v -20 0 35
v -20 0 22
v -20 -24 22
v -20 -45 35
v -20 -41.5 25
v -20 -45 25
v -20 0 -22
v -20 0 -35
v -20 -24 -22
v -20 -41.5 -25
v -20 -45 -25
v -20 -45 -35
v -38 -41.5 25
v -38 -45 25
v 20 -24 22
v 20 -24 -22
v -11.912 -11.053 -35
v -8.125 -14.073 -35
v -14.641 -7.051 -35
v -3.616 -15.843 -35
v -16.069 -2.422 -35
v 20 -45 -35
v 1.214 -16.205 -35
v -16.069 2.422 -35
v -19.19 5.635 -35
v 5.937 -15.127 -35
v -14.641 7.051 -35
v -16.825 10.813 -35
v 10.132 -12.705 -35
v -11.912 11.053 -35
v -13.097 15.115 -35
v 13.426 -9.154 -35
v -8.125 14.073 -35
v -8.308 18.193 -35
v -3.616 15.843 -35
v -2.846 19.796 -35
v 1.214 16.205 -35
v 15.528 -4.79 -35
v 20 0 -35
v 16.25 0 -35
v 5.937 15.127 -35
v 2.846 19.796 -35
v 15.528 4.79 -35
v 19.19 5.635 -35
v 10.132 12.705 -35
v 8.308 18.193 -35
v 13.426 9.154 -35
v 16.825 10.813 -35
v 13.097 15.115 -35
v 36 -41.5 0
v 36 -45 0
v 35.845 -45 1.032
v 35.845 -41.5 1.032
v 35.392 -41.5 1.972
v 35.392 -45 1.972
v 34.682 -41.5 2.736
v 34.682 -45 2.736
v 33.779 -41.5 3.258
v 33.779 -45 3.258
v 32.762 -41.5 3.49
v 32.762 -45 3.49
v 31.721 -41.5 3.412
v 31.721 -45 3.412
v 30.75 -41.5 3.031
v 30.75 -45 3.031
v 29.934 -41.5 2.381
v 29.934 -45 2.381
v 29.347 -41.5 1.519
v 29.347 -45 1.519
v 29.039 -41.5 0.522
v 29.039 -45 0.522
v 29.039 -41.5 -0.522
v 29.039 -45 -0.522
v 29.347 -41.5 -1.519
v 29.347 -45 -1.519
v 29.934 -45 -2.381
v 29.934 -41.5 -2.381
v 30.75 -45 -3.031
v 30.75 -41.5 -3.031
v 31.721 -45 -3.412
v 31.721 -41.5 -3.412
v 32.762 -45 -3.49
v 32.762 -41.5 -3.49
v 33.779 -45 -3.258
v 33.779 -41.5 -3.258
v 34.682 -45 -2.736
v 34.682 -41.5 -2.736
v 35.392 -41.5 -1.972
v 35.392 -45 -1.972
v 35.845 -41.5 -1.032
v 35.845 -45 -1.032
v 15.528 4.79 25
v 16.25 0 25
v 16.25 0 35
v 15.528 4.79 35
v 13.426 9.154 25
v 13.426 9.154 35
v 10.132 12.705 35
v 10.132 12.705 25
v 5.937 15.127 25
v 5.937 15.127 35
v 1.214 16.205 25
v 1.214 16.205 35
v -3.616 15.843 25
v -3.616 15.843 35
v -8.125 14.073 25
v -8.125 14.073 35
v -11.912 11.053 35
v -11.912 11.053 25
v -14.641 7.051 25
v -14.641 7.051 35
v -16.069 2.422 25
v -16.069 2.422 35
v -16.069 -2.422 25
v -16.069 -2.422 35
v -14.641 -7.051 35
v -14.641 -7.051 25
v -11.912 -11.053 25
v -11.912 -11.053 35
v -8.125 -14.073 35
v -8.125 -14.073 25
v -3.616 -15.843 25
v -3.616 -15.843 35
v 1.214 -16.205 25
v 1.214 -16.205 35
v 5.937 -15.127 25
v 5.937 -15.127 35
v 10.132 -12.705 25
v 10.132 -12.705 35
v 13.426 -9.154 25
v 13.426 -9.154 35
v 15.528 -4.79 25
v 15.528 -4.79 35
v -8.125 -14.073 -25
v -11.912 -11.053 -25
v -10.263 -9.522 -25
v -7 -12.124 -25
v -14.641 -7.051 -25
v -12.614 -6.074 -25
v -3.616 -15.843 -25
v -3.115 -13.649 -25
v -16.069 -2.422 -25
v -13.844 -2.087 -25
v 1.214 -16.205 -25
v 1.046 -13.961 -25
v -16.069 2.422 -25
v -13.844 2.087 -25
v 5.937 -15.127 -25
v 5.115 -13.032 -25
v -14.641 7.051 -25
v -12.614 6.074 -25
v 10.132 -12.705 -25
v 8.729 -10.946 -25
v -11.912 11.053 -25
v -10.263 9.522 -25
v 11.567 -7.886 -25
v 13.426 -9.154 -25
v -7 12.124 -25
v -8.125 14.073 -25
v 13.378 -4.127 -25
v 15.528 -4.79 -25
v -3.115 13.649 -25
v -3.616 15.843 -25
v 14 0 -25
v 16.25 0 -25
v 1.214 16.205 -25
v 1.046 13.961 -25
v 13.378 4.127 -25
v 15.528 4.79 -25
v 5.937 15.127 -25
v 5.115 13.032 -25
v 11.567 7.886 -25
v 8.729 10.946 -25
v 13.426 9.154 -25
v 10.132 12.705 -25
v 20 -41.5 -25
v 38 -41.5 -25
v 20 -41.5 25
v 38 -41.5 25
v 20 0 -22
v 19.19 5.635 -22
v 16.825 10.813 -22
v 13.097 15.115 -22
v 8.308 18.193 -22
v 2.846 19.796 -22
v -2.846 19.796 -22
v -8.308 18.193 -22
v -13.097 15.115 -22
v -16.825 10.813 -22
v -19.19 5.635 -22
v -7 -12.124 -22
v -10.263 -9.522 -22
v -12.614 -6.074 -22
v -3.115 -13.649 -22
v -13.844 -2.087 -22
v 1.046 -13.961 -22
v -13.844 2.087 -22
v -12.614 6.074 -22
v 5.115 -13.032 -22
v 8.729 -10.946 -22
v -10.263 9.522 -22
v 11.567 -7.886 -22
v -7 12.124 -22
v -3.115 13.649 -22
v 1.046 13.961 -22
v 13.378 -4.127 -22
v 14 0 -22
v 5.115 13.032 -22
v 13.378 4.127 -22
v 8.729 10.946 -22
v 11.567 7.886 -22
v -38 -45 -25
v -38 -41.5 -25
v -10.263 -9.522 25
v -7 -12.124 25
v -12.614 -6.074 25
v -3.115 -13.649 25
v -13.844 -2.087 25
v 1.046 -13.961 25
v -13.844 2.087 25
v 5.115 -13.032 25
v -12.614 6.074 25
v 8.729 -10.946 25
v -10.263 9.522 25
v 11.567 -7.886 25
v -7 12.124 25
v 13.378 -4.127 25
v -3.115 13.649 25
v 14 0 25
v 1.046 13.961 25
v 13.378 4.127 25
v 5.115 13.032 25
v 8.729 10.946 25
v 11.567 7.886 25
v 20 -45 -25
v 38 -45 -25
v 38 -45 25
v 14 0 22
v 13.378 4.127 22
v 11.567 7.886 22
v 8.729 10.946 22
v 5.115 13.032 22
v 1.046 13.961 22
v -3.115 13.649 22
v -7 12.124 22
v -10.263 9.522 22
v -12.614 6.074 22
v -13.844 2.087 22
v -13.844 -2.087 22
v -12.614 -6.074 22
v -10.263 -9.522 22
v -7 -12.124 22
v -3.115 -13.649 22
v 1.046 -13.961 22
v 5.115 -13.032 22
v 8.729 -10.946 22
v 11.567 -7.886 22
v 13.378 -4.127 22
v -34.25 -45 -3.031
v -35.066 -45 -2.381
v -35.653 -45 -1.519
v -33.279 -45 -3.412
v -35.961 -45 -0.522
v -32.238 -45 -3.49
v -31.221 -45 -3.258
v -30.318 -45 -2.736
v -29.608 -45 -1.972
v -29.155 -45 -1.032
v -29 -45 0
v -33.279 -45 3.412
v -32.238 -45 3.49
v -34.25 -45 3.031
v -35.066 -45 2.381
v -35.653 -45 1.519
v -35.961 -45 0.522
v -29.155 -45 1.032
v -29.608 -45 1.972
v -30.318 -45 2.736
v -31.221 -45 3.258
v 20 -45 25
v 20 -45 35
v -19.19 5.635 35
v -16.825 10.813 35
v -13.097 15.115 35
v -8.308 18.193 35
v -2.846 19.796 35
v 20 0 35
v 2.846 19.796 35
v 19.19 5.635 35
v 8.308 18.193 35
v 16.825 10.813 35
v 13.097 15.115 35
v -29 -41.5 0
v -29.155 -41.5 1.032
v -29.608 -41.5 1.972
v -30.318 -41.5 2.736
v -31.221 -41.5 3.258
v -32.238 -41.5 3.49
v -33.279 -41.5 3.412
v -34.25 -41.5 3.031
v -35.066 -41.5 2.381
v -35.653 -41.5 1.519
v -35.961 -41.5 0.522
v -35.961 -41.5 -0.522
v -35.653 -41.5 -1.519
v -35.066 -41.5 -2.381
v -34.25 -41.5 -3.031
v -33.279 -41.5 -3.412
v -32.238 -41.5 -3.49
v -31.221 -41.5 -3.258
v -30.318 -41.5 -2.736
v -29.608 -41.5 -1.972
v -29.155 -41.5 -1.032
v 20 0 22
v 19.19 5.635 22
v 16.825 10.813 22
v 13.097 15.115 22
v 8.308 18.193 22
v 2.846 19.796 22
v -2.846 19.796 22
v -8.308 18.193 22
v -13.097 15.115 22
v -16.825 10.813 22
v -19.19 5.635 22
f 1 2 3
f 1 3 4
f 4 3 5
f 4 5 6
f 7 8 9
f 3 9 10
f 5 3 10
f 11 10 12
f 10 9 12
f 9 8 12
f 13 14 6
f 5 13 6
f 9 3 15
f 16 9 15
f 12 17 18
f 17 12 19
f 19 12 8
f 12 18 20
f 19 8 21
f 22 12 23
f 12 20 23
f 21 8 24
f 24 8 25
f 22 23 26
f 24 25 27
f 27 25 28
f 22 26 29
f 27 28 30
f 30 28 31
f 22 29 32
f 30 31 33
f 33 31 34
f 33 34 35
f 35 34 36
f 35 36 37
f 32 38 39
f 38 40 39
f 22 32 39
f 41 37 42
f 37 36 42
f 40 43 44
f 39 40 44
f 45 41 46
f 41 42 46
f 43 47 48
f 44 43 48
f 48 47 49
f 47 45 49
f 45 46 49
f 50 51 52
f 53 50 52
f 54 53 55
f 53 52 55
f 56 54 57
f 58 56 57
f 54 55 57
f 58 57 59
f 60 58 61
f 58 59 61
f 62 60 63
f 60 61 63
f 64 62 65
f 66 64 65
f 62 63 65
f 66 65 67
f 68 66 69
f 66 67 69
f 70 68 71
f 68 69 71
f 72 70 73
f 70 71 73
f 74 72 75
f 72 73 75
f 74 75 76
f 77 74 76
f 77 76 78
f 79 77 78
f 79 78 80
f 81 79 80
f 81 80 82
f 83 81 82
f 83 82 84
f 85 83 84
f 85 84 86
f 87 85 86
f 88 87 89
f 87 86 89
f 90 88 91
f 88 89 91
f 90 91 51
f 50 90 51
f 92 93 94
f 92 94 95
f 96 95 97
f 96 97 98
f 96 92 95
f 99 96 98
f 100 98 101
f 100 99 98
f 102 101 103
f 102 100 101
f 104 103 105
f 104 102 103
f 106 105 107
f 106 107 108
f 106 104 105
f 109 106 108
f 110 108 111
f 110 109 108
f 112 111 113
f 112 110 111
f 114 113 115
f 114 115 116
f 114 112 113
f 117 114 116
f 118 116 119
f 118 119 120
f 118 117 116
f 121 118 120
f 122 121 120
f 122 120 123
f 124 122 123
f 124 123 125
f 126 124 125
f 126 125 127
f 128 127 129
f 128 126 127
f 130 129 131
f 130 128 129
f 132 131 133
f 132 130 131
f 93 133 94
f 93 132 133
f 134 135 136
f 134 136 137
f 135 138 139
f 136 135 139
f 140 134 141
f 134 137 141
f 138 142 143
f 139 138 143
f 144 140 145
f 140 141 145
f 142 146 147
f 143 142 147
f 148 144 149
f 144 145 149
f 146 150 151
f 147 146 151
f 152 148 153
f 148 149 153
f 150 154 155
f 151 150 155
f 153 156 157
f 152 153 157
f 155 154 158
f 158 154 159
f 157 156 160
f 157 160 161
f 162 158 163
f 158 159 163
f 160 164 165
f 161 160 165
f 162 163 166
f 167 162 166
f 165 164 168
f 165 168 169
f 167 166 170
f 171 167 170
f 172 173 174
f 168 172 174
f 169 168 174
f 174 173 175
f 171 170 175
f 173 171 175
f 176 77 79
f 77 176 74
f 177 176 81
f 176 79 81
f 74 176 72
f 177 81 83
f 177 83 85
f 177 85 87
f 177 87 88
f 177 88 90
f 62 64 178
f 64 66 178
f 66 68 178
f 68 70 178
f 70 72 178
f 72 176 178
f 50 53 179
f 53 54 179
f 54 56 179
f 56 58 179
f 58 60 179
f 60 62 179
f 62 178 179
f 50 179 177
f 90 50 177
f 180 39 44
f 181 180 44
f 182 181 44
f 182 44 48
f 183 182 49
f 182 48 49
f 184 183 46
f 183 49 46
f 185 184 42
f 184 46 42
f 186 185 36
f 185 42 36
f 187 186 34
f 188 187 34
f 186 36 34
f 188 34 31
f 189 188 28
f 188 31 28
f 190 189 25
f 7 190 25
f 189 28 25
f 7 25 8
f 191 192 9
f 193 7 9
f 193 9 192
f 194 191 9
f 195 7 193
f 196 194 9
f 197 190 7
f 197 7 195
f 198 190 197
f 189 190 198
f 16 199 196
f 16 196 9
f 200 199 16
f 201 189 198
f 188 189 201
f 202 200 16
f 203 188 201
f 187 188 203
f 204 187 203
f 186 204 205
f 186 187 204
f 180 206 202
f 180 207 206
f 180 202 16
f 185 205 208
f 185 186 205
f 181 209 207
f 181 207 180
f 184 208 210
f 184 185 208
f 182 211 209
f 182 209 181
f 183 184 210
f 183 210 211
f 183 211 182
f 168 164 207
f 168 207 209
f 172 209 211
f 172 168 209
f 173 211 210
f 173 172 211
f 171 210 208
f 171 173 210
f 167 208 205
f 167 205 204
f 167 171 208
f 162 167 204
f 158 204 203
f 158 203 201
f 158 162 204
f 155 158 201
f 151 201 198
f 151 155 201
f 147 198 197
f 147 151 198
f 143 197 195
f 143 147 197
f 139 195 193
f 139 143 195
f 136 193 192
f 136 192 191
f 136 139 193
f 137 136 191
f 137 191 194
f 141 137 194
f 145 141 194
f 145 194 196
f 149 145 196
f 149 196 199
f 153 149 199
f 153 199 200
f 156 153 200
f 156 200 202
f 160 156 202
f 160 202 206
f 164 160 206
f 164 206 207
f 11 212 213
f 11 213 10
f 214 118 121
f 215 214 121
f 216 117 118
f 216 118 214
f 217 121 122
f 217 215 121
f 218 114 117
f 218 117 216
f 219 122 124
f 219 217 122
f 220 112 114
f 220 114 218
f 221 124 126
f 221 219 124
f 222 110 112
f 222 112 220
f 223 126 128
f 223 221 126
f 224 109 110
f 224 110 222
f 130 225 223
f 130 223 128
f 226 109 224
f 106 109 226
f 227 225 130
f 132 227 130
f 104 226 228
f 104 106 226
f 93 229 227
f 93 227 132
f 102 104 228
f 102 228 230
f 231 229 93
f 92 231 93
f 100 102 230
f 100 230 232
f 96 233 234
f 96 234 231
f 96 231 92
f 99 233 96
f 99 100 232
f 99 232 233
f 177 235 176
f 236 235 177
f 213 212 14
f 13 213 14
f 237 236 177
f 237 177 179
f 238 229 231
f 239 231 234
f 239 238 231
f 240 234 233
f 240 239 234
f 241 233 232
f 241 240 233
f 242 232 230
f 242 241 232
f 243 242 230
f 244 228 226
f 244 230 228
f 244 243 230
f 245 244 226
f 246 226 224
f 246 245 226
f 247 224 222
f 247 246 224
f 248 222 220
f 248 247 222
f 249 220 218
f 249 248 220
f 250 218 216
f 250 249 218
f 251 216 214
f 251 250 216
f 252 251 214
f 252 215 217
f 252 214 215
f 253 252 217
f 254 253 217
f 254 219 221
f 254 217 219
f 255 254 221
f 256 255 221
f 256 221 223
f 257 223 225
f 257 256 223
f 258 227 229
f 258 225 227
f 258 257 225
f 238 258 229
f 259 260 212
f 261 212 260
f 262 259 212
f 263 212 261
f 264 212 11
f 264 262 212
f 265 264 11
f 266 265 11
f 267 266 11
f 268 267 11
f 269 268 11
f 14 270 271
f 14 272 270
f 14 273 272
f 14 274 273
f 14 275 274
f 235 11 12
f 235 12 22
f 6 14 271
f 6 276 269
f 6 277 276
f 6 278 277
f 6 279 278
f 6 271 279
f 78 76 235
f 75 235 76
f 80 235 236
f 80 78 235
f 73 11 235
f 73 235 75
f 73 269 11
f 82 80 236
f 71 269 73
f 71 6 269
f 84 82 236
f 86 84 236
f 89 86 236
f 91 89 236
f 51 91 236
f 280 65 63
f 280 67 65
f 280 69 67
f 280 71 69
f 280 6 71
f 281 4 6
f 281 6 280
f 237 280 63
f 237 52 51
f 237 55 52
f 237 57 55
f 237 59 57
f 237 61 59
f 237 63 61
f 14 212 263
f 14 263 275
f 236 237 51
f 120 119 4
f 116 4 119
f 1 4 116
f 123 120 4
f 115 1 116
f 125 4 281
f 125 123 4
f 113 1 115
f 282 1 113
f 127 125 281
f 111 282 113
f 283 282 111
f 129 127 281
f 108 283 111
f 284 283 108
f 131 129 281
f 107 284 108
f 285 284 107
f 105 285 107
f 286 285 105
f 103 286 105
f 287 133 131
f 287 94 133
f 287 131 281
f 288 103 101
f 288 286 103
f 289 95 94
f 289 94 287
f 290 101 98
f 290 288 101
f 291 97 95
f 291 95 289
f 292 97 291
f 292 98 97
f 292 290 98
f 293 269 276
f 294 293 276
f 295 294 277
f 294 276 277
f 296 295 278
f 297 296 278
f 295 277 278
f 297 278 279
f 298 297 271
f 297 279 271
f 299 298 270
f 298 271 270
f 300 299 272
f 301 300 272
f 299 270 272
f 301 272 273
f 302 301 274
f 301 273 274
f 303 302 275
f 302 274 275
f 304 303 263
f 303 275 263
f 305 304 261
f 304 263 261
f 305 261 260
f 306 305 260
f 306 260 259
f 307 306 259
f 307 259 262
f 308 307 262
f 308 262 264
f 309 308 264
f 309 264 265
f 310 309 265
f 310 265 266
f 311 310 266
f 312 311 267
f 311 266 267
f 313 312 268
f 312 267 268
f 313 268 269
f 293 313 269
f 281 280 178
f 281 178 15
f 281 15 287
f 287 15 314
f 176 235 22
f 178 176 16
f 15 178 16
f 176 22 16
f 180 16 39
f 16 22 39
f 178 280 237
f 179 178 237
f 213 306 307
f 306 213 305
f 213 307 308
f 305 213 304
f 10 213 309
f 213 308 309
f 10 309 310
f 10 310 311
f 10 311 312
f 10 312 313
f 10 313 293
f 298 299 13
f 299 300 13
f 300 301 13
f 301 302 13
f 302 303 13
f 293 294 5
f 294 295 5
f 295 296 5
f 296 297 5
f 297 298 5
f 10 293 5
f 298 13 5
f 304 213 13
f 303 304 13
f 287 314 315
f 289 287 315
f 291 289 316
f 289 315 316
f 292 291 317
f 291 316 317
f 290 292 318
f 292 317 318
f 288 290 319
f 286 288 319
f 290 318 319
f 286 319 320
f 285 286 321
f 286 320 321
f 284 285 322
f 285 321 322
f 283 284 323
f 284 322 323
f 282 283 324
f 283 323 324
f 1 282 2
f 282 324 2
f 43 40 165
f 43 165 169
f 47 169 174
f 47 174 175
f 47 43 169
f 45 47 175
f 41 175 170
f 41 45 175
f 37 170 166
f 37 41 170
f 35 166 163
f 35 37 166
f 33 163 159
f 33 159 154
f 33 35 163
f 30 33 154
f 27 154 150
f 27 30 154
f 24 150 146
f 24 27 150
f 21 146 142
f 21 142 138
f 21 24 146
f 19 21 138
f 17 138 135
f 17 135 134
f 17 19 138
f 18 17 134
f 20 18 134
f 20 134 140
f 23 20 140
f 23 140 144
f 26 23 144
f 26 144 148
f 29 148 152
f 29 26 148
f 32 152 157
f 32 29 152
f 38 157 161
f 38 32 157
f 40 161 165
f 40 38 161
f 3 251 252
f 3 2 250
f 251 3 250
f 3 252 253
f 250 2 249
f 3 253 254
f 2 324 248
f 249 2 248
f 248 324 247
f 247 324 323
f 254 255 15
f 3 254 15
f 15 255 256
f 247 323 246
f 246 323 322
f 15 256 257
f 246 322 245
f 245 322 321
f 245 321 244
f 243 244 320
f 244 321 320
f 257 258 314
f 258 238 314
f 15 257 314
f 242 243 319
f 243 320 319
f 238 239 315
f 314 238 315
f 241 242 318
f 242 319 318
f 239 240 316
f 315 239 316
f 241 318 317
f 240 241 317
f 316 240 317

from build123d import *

# Parameters (mm, degrees)
SKETCH002_AS_DRAWN_W                 = 76
SKETCH002_AS_DRAWN_H                 = 50
SKETCH002_AS_DRAWN_R                 = 3.5
EXTRUDE003_DEPTH                     = 3.5
EXTRUDE003_ONTO_SKETCH002_ROLL_ANGLE = 90
CYLINDER_R                           = 16.25
CYLINDER_DEPTH                       = 10
SKETCH_R                             = 14
EXTRUDE001_DEPTH                     = 13
CYLINDER001_R                        = 16.25
CYLINDER001_DEPTH                    = 10
EXTRUDE_DEPTH                        = 13
SKETCH001_AS_DRAWN_W                 = 40
SKETCH001_AS_DRAWN_H                 = 70
EXTRUDE002_DEPTH                     = 21
EXTRUDE002_ONTO_SKETCH001_ROLL_ANGLE = 90


with BuildPart() as extrude003:
    # Sketch002 as drawn → Extrude003 (new)
    with BuildSketch(Plane.XY):
        Rectangle(SKETCH002_AS_DRAWN_W, SKETCH002_AS_DRAWN_H)
        with Locations((-32.5, 0)):
            Circle(SKETCH002_AS_DRAWN_R, mode=Mode.SUBTRACT)
        with Locations((32.5, 0)):
            Circle(SKETCH002_AS_DRAWN_R, mode=Mode.SUBTRACT)
    extrude(amount=-EXTRUDE003_DEPTH)


with BuildPart() as extrude003_1:
    # Extrude003 onto Sketch002 roll: moved
    add(extrude003.part.rotate(Axis((0, 0, 0), (1, 0, 0)), EXTRUDE003_ONTO_SKETCH002_ROLL_ANGLE))


with BuildPart() as extrude003_2:
    # Extrude003 onto Sketch002 placement: moved
    add(extrude003_1.part)


with BuildPart() as extrude003_3:
    # Extrude003 placement: moved
    add(extrude003_2.part.moved(Location((0, -45, 0))))


with BuildPart() as cylinder:
    # Cylinder → Cylinder (new body)
    with BuildSketch(Plane.XY):
        Circle(CYLINDER_R)
    extrude(amount=CYLINDER_DEPTH)


with BuildPart() as barin_nest_l_cut:
    # Sketch → Extrude001 (new body)
    with BuildSketch(Plane.XY):
        with BuildLine():
            ThreePointArc((20, 0), (0, 20), (-20, 0))
            Line((-20, 0), (-20, -35))
            Line((-20, -35), (20, -35))
            Line((20, -35), (20, 0))
        make_face()
        Circle(SKETCH_R, mode=Mode.SUBTRACT)
    extrude(amount=EXTRUDE001_DEPTH)

    # Cut: cut Cylinder
    add(cylinder.part, mode=Mode.SUBTRACT)


with BuildPart() as barin_nest_l_cut_1:
    # Cut placement: moved
    add(barin_nest_l_cut.part.moved(Location((0, 0, -35))))


with BuildPart() as cylinder001:
    # Cylinder001 → Cylinder001 (new body)
    with BuildSketch(Plane.XY.offset(3)):
        Circle(CYLINDER001_R)
    extrude(amount=CYLINDER001_DEPTH)


with BuildPart() as bearing_nest_r_cut:
    # Sketch → Extrude (new body)
    with BuildSketch(Plane.XY):
        with BuildLine():
            ThreePointArc((20, 0), (0, 20), (-20, 0))
            Line((-20, 0), (-20, -35))
            Line((-20, -35), (20, -35))
            Line((20, -35), (20, 0))
        make_face()
        Circle(SKETCH_R, mode=Mode.SUBTRACT)
    extrude(amount=EXTRUDE_DEPTH)

    # Cut001: cut Cylinder001
    add(cylinder001.part, mode=Mode.SUBTRACT)


with BuildPart() as bearing_nest_r_cut_1:
    # Cut001 placement: moved
    add(bearing_nest_r_cut.part.moved(Location((0, 0, 22))))


with BuildPart() as fusion:
    # Sketch001 as drawn → Extrude002 (new)
    with BuildSketch(Plane.XY):
        Rectangle(SKETCH001_AS_DRAWN_W, SKETCH001_AS_DRAWN_H)
    extrude(amount=-EXTRUDE002_DEPTH)


with BuildPart() as fusion_1:
    # Extrude002 onto Sketch001 roll: moved
    add(fusion.part.rotate(Axis((0, 0, 0), (1, 0, 0)), EXTRUDE002_ONTO_SKETCH001_ROLL_ANGLE))


with BuildPart() as fusion_2:
    # Extrude002 onto Sketch001 placement: moved
    add(fusion_1.part)


with BuildPart() as fusion_3:
    # Extrude002 placement: moved
    add(fusion_2.part.moved(Location((0, -45, 0))))

    # Fusion: union Extrude003, barin-nest-l-cut, bearing-nest-r-cut
    add(extrude003_3.part)
    add(barin_nest_l_cut_1.part)
    add(bearing_nest_r_cut_1.part)


solid = fusion_3.part
